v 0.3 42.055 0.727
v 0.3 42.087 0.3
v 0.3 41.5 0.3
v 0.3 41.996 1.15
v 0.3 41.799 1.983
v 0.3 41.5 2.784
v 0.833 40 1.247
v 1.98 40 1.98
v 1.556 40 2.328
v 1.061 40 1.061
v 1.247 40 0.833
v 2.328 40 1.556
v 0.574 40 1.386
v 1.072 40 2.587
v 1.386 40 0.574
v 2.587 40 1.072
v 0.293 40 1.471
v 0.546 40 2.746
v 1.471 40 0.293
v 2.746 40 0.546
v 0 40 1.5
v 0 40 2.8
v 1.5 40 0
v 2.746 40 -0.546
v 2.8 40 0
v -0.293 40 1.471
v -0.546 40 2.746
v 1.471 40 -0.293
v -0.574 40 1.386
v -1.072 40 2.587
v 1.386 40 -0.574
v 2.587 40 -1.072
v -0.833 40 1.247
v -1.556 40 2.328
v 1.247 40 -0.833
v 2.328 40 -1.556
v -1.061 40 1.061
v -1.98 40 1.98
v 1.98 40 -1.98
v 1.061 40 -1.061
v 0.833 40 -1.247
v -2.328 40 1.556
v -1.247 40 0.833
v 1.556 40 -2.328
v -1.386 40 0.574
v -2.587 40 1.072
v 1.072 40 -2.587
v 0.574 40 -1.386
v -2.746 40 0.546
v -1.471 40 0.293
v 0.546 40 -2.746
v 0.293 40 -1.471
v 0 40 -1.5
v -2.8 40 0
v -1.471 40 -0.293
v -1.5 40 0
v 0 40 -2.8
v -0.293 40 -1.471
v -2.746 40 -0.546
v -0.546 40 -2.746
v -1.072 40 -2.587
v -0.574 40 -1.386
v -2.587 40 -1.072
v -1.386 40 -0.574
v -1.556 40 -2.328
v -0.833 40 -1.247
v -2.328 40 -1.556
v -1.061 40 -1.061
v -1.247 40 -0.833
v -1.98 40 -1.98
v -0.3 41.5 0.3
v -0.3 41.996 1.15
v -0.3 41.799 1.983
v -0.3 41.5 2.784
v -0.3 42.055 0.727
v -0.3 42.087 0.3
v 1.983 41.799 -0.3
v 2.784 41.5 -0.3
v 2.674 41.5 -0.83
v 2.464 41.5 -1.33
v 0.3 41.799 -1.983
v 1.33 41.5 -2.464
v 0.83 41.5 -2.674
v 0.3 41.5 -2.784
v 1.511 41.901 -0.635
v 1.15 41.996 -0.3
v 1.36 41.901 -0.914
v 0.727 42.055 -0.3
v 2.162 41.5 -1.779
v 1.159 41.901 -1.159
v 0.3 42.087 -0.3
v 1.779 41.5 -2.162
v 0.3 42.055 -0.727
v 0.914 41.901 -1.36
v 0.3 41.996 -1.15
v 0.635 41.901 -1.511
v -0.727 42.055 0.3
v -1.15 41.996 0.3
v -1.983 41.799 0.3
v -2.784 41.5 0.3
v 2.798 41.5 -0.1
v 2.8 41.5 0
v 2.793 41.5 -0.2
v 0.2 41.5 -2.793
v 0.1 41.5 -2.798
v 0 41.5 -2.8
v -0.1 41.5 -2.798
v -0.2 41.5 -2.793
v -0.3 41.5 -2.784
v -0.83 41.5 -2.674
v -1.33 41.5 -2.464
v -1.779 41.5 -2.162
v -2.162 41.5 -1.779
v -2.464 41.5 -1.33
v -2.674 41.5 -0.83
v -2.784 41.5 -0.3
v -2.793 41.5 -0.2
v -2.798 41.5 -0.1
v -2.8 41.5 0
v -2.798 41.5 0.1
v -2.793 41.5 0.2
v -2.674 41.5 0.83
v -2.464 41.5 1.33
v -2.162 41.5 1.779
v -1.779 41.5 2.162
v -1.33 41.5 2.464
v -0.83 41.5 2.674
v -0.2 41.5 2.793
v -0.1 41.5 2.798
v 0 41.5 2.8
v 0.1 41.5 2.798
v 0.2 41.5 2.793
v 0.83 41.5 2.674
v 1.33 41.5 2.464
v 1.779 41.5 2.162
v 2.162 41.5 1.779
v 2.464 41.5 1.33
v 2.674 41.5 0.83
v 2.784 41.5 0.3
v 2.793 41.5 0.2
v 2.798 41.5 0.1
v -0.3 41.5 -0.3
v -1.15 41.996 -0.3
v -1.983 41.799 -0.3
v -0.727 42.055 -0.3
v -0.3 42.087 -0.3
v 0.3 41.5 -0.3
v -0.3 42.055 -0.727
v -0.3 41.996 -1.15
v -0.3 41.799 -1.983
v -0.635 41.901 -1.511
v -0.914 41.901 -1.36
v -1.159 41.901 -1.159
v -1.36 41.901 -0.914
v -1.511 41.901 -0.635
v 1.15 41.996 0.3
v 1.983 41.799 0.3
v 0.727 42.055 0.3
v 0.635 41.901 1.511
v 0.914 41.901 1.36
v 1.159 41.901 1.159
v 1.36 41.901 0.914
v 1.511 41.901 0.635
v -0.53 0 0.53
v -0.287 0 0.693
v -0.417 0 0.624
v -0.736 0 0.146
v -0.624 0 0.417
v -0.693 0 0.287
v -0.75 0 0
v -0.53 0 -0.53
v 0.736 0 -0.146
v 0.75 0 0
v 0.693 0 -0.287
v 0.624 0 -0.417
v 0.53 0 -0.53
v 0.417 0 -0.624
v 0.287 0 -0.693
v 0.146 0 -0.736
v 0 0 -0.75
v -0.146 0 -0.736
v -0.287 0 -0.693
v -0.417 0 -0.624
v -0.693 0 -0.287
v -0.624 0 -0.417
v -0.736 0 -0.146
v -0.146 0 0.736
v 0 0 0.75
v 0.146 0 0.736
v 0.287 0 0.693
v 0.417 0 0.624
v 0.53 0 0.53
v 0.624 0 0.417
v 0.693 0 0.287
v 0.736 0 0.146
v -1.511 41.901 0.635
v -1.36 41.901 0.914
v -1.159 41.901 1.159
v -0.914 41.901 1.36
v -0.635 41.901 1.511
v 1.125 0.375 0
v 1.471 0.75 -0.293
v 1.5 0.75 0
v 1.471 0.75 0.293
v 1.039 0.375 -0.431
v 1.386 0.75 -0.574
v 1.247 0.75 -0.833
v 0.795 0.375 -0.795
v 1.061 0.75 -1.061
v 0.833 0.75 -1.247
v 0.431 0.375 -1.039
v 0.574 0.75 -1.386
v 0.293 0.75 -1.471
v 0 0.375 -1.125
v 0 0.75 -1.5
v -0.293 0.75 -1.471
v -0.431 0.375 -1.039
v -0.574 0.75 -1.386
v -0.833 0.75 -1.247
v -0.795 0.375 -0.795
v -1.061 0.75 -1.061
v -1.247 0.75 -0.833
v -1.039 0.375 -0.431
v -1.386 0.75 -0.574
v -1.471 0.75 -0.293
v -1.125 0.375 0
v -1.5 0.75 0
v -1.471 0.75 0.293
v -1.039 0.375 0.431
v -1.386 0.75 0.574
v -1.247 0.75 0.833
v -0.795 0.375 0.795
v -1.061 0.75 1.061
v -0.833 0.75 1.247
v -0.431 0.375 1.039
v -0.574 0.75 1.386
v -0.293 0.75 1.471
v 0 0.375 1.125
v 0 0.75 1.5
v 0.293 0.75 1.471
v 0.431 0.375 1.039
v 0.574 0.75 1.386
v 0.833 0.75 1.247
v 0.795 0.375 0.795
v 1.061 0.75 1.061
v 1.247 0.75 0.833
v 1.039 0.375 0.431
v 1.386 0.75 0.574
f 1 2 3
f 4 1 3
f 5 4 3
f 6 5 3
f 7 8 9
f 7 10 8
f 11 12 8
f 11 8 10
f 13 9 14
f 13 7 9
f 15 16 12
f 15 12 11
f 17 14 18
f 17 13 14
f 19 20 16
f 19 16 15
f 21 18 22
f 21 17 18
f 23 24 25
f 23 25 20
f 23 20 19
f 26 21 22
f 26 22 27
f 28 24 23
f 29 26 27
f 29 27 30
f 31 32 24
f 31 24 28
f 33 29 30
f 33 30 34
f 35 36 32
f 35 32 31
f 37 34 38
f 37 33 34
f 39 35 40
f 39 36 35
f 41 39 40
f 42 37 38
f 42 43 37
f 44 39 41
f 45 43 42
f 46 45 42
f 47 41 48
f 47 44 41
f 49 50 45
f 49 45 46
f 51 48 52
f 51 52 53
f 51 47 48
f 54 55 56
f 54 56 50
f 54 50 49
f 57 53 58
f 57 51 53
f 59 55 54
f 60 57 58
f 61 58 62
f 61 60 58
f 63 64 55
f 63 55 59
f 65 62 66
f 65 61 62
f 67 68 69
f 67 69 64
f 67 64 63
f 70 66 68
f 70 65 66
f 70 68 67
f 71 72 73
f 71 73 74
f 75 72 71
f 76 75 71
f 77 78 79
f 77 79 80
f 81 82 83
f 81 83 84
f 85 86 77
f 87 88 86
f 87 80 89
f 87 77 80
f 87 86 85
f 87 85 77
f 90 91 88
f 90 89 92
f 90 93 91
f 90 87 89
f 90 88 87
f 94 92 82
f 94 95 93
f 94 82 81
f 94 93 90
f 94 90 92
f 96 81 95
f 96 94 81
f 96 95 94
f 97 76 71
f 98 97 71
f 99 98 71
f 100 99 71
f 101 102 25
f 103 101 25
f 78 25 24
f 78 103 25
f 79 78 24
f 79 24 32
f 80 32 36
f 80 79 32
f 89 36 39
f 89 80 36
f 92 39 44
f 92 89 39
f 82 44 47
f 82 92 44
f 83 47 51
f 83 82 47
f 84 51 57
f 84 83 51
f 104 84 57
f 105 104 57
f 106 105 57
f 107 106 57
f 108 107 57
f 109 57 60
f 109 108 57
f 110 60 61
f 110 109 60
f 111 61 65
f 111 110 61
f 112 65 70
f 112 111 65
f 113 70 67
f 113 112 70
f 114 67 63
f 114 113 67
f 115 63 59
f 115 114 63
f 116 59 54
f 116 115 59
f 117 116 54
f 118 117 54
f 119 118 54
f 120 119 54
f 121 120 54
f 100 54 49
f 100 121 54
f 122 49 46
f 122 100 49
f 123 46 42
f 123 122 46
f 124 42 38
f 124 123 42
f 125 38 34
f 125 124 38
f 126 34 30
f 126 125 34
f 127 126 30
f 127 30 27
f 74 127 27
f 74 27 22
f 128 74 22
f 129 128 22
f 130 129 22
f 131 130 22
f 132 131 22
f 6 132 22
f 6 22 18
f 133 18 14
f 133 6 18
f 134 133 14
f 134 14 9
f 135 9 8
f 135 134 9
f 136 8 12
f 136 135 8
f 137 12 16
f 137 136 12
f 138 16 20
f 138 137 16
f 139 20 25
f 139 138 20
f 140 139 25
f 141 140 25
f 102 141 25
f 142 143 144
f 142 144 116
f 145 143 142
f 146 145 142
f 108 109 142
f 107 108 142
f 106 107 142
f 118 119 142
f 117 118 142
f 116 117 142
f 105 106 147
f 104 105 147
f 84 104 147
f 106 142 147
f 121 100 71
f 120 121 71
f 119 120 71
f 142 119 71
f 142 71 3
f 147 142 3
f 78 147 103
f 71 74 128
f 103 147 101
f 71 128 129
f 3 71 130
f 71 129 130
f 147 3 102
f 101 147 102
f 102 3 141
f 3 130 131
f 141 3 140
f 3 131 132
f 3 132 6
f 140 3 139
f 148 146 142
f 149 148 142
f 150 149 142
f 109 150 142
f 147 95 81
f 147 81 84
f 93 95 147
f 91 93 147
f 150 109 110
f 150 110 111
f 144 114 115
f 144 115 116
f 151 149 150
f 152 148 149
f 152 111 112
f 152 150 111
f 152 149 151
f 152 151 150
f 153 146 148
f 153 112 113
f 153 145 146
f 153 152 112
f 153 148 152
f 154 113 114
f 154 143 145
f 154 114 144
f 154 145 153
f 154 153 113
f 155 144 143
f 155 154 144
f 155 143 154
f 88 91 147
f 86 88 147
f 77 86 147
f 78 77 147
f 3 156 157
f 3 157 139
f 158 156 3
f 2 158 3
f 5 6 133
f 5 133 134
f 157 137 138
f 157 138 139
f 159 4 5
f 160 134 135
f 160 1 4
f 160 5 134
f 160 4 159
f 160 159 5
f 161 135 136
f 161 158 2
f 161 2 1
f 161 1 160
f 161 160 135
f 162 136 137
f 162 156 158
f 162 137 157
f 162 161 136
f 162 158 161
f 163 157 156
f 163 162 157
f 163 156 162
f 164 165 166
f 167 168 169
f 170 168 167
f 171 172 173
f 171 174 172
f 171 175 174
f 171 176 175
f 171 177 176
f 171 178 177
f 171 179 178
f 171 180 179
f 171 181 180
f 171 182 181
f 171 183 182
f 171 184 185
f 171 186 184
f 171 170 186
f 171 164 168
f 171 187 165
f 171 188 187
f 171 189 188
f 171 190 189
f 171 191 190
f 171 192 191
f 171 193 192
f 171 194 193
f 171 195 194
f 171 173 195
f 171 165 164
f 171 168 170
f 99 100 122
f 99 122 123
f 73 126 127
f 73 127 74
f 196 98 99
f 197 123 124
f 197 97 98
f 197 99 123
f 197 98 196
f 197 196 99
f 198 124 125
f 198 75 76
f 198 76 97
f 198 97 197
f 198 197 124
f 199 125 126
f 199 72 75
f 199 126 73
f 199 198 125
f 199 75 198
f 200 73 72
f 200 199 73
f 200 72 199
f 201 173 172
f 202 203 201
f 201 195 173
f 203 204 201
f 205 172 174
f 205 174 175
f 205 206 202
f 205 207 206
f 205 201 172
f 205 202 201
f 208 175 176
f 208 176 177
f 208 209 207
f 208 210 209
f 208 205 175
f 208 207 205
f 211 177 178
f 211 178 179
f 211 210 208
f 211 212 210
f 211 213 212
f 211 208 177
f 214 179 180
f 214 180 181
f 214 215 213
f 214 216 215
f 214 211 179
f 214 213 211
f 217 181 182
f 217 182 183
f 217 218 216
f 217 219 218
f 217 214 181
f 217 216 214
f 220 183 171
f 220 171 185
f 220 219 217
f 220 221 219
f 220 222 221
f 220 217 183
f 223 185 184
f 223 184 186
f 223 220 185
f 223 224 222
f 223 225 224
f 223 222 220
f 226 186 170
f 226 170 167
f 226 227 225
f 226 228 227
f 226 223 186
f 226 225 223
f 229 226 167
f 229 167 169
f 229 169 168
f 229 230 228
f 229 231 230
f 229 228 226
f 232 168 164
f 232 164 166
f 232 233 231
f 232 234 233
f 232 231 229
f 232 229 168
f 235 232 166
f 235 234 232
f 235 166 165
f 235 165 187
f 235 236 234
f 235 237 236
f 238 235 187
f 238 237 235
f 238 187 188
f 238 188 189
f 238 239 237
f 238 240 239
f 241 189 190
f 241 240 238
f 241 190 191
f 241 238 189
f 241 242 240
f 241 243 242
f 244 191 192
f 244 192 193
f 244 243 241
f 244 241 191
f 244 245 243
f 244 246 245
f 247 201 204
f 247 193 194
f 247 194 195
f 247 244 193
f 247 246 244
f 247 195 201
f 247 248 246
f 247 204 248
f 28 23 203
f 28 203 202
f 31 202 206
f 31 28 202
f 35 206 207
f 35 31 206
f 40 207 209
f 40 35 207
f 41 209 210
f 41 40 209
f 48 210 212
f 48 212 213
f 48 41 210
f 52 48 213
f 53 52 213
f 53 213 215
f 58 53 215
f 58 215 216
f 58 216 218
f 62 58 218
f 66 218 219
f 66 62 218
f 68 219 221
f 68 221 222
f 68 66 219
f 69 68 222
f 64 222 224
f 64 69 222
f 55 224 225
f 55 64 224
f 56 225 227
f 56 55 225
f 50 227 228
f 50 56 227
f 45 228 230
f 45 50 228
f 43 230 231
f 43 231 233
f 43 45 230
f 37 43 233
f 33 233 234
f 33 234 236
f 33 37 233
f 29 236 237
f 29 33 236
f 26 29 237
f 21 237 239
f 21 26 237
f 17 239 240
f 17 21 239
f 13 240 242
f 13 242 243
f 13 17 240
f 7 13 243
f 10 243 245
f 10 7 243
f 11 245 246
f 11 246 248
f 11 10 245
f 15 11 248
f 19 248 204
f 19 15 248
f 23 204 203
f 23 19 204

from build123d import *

# Parameters (mm, degrees)
WYTNIJ_WYCI_GNI_CIE1_START = -5
SZKIC2_W                   = 0.6
SZKIC2_H                   = 0.6
WYTNIJ_WYCI_GNI_CIE1_DEPTH = 3.5
SFAZOWANIE1_SIZE           = 0.75


with BuildPart() as part:
    # Szkic1 → Obrót1 (revolve)
    with BuildSketch(Plane.XY, mode=Mode.PRIVATE) as obr_t1_sk:
        with BuildLine():
            Line((0, 0), (-1.5, 0))
            Line((-1.5, 0), (-1.5, 40))
            Line((-1.5, 40), (-2.8, 40))
            Line((-2.8, 40), (-2.8, 41.5))
            ThreePointArc((-2.8, 41.5), (-1.431782106, 41.948316496), (0, 42.1))
            Line((0, 42.1), (0, 0))
        make_face()
    revolve(obr_t1_sk.sketch.rotate(Axis((0, 0, 0), (0, 1, 0)), 180), axis=Axis((0, 0, 0), (0, 1, 0)))

    # Szkic2 → Wytnij-wyciągnięcie1 (cut)
    with BuildSketch(Plane.XZ.offset(-40).offset(WYTNIJ_WYCI_GNI_CIE1_START)):
        with BuildLine():
            Line((0.3, -0.3), (-0.3, -0.3))
            Line((-0.3, -0.3), (-0.3, -1.469693846))
            ThreePointArc((-0.3, -1.469693846), (0, -1.5), (0.3, -1.469693846))
            Line((0.3, -1.469693846), (0.3, -0.3))
        make_face()
        with BuildLine():
            Line((-0.3, -0.3), (-0.3, 0.3))
            Line((-0.3, 0.3), (-1.469693846, 0.3))
            ThreePointArc((-1.469693846, 0.3), (-1.5, 0), (-1.469693846, -0.3))
            Line((-1.469693846, -0.3), (-0.3, -0.3))
        make_face()
        with BuildLine():
            ThreePointArc((0.3, 1.469693846), (0, 1.5), (-0.3, 1.469693846))
            Line((-0.3, 1.469693846), (-0.3, 0.3))
            Line((-0.3, 0.3), (0.3, 0.3))
            Line((0.3, 0.3), (0.3, 1.469693846))
        make_face()
        with BuildLine():
            ThreePointArc((0.3, 2.783882181), (0.150216331, 2.795967642), (0, 2.8))
            ThreePointArc((0, 2.8), (-0.150216331, 2.795967642), (-0.3, 2.783882181))
            Line((-0.3, 2.783882181), (-0.3, 1.469693846))
            ThreePointArc((-0.3, 1.469693846), (0, 1.5), (0.3, 1.469693846))
            Line((0.3, 1.469693846), (0.3, 2.783882181))
        make_face()
        with BuildLine():
            ThreePointArc((0.3, -1.469693846), (0, -1.5), (-0.3, -1.469693846))
            Line((-0.3, -1.469693846), (-0.3, -2.783882181))
            ThreePointArc((-0.3, -2.783882181), (-0.150216331, -2.795967642), (0, -2.8))
            ThreePointArc((0, -2.8), (0.150216331, -2.795967642), (0.3, -2.783882181))
            Line((0.3, -2.783882181), (0.3, -1.469693846))
        make_face()
        with BuildLine():
            Line((-1.469693846, 0.3), (-2.783882181, 0.3))
            ThreePointArc((-2.783882181, 0.3), (-2.795967642, 0.150216331), (-2.8, 0))
            ThreePointArc((-2.8, 0), (-2.795967642, -0.150216331), (-2.783882181, -0.3))
            Line((-2.783882181, -0.3), (-1.469693846, -0.3))
            ThreePointArc((-1.469693846, -0.3), (-1.5, 0), (-1.469693846, 0.3))
        make_face()
        with BuildLine():
            ThreePointArc((2.8, 0), (2.795967642, 0.150216331), (2.783882181, 0.3))
            Line((2.783882181, 0.3), (1.469693846, 0.3))
            ThreePointArc((1.469693846, 0.3), (1.49240423, 0.150763443), (1.5, 0))
            ThreePointArc((1.5, 0), (1.49240423, -0.150763443), (1.469693846, -0.3))
            Line((1.469693846, -0.3), (2.783882181, -0.3))
            ThreePointArc((2.783882181, -0.3), (2.795967642, -0.150216331), (2.8, 0))
        make_face()
        with BuildLine():
            Line((1.469693846, 0.3), (0.3, 0.3))
            Line((0.3, 0.3), (0.3, -0.3))
            Line((0.3, -0.3), (1.469693846, -0.3))
            ThreePointArc((1.469693846, -0.3), (1.49240423, -0.150763443), (1.5, 0))
            ThreePointArc((1.5, 0), (1.49240423, 0.150763443), (1.469693846, 0.3))
        make_face()
        Rectangle(SZKIC2_W, SZKIC2_H)
    extrude(amount=WYTNIJ_WYCI_GNI_CIE1_DEPTH, mode=Mode.SUBTRACT)

    # Sfazowanie1
    sfazowanie1_edges = [part.edges().sort_by_distance(p)[0] for p in [
        (-1.5, 0, 0),
    ]]
    chamfer(sfazowanie1_edges, length=SFAZOWANIE1_SIZE)


solid = part.part
